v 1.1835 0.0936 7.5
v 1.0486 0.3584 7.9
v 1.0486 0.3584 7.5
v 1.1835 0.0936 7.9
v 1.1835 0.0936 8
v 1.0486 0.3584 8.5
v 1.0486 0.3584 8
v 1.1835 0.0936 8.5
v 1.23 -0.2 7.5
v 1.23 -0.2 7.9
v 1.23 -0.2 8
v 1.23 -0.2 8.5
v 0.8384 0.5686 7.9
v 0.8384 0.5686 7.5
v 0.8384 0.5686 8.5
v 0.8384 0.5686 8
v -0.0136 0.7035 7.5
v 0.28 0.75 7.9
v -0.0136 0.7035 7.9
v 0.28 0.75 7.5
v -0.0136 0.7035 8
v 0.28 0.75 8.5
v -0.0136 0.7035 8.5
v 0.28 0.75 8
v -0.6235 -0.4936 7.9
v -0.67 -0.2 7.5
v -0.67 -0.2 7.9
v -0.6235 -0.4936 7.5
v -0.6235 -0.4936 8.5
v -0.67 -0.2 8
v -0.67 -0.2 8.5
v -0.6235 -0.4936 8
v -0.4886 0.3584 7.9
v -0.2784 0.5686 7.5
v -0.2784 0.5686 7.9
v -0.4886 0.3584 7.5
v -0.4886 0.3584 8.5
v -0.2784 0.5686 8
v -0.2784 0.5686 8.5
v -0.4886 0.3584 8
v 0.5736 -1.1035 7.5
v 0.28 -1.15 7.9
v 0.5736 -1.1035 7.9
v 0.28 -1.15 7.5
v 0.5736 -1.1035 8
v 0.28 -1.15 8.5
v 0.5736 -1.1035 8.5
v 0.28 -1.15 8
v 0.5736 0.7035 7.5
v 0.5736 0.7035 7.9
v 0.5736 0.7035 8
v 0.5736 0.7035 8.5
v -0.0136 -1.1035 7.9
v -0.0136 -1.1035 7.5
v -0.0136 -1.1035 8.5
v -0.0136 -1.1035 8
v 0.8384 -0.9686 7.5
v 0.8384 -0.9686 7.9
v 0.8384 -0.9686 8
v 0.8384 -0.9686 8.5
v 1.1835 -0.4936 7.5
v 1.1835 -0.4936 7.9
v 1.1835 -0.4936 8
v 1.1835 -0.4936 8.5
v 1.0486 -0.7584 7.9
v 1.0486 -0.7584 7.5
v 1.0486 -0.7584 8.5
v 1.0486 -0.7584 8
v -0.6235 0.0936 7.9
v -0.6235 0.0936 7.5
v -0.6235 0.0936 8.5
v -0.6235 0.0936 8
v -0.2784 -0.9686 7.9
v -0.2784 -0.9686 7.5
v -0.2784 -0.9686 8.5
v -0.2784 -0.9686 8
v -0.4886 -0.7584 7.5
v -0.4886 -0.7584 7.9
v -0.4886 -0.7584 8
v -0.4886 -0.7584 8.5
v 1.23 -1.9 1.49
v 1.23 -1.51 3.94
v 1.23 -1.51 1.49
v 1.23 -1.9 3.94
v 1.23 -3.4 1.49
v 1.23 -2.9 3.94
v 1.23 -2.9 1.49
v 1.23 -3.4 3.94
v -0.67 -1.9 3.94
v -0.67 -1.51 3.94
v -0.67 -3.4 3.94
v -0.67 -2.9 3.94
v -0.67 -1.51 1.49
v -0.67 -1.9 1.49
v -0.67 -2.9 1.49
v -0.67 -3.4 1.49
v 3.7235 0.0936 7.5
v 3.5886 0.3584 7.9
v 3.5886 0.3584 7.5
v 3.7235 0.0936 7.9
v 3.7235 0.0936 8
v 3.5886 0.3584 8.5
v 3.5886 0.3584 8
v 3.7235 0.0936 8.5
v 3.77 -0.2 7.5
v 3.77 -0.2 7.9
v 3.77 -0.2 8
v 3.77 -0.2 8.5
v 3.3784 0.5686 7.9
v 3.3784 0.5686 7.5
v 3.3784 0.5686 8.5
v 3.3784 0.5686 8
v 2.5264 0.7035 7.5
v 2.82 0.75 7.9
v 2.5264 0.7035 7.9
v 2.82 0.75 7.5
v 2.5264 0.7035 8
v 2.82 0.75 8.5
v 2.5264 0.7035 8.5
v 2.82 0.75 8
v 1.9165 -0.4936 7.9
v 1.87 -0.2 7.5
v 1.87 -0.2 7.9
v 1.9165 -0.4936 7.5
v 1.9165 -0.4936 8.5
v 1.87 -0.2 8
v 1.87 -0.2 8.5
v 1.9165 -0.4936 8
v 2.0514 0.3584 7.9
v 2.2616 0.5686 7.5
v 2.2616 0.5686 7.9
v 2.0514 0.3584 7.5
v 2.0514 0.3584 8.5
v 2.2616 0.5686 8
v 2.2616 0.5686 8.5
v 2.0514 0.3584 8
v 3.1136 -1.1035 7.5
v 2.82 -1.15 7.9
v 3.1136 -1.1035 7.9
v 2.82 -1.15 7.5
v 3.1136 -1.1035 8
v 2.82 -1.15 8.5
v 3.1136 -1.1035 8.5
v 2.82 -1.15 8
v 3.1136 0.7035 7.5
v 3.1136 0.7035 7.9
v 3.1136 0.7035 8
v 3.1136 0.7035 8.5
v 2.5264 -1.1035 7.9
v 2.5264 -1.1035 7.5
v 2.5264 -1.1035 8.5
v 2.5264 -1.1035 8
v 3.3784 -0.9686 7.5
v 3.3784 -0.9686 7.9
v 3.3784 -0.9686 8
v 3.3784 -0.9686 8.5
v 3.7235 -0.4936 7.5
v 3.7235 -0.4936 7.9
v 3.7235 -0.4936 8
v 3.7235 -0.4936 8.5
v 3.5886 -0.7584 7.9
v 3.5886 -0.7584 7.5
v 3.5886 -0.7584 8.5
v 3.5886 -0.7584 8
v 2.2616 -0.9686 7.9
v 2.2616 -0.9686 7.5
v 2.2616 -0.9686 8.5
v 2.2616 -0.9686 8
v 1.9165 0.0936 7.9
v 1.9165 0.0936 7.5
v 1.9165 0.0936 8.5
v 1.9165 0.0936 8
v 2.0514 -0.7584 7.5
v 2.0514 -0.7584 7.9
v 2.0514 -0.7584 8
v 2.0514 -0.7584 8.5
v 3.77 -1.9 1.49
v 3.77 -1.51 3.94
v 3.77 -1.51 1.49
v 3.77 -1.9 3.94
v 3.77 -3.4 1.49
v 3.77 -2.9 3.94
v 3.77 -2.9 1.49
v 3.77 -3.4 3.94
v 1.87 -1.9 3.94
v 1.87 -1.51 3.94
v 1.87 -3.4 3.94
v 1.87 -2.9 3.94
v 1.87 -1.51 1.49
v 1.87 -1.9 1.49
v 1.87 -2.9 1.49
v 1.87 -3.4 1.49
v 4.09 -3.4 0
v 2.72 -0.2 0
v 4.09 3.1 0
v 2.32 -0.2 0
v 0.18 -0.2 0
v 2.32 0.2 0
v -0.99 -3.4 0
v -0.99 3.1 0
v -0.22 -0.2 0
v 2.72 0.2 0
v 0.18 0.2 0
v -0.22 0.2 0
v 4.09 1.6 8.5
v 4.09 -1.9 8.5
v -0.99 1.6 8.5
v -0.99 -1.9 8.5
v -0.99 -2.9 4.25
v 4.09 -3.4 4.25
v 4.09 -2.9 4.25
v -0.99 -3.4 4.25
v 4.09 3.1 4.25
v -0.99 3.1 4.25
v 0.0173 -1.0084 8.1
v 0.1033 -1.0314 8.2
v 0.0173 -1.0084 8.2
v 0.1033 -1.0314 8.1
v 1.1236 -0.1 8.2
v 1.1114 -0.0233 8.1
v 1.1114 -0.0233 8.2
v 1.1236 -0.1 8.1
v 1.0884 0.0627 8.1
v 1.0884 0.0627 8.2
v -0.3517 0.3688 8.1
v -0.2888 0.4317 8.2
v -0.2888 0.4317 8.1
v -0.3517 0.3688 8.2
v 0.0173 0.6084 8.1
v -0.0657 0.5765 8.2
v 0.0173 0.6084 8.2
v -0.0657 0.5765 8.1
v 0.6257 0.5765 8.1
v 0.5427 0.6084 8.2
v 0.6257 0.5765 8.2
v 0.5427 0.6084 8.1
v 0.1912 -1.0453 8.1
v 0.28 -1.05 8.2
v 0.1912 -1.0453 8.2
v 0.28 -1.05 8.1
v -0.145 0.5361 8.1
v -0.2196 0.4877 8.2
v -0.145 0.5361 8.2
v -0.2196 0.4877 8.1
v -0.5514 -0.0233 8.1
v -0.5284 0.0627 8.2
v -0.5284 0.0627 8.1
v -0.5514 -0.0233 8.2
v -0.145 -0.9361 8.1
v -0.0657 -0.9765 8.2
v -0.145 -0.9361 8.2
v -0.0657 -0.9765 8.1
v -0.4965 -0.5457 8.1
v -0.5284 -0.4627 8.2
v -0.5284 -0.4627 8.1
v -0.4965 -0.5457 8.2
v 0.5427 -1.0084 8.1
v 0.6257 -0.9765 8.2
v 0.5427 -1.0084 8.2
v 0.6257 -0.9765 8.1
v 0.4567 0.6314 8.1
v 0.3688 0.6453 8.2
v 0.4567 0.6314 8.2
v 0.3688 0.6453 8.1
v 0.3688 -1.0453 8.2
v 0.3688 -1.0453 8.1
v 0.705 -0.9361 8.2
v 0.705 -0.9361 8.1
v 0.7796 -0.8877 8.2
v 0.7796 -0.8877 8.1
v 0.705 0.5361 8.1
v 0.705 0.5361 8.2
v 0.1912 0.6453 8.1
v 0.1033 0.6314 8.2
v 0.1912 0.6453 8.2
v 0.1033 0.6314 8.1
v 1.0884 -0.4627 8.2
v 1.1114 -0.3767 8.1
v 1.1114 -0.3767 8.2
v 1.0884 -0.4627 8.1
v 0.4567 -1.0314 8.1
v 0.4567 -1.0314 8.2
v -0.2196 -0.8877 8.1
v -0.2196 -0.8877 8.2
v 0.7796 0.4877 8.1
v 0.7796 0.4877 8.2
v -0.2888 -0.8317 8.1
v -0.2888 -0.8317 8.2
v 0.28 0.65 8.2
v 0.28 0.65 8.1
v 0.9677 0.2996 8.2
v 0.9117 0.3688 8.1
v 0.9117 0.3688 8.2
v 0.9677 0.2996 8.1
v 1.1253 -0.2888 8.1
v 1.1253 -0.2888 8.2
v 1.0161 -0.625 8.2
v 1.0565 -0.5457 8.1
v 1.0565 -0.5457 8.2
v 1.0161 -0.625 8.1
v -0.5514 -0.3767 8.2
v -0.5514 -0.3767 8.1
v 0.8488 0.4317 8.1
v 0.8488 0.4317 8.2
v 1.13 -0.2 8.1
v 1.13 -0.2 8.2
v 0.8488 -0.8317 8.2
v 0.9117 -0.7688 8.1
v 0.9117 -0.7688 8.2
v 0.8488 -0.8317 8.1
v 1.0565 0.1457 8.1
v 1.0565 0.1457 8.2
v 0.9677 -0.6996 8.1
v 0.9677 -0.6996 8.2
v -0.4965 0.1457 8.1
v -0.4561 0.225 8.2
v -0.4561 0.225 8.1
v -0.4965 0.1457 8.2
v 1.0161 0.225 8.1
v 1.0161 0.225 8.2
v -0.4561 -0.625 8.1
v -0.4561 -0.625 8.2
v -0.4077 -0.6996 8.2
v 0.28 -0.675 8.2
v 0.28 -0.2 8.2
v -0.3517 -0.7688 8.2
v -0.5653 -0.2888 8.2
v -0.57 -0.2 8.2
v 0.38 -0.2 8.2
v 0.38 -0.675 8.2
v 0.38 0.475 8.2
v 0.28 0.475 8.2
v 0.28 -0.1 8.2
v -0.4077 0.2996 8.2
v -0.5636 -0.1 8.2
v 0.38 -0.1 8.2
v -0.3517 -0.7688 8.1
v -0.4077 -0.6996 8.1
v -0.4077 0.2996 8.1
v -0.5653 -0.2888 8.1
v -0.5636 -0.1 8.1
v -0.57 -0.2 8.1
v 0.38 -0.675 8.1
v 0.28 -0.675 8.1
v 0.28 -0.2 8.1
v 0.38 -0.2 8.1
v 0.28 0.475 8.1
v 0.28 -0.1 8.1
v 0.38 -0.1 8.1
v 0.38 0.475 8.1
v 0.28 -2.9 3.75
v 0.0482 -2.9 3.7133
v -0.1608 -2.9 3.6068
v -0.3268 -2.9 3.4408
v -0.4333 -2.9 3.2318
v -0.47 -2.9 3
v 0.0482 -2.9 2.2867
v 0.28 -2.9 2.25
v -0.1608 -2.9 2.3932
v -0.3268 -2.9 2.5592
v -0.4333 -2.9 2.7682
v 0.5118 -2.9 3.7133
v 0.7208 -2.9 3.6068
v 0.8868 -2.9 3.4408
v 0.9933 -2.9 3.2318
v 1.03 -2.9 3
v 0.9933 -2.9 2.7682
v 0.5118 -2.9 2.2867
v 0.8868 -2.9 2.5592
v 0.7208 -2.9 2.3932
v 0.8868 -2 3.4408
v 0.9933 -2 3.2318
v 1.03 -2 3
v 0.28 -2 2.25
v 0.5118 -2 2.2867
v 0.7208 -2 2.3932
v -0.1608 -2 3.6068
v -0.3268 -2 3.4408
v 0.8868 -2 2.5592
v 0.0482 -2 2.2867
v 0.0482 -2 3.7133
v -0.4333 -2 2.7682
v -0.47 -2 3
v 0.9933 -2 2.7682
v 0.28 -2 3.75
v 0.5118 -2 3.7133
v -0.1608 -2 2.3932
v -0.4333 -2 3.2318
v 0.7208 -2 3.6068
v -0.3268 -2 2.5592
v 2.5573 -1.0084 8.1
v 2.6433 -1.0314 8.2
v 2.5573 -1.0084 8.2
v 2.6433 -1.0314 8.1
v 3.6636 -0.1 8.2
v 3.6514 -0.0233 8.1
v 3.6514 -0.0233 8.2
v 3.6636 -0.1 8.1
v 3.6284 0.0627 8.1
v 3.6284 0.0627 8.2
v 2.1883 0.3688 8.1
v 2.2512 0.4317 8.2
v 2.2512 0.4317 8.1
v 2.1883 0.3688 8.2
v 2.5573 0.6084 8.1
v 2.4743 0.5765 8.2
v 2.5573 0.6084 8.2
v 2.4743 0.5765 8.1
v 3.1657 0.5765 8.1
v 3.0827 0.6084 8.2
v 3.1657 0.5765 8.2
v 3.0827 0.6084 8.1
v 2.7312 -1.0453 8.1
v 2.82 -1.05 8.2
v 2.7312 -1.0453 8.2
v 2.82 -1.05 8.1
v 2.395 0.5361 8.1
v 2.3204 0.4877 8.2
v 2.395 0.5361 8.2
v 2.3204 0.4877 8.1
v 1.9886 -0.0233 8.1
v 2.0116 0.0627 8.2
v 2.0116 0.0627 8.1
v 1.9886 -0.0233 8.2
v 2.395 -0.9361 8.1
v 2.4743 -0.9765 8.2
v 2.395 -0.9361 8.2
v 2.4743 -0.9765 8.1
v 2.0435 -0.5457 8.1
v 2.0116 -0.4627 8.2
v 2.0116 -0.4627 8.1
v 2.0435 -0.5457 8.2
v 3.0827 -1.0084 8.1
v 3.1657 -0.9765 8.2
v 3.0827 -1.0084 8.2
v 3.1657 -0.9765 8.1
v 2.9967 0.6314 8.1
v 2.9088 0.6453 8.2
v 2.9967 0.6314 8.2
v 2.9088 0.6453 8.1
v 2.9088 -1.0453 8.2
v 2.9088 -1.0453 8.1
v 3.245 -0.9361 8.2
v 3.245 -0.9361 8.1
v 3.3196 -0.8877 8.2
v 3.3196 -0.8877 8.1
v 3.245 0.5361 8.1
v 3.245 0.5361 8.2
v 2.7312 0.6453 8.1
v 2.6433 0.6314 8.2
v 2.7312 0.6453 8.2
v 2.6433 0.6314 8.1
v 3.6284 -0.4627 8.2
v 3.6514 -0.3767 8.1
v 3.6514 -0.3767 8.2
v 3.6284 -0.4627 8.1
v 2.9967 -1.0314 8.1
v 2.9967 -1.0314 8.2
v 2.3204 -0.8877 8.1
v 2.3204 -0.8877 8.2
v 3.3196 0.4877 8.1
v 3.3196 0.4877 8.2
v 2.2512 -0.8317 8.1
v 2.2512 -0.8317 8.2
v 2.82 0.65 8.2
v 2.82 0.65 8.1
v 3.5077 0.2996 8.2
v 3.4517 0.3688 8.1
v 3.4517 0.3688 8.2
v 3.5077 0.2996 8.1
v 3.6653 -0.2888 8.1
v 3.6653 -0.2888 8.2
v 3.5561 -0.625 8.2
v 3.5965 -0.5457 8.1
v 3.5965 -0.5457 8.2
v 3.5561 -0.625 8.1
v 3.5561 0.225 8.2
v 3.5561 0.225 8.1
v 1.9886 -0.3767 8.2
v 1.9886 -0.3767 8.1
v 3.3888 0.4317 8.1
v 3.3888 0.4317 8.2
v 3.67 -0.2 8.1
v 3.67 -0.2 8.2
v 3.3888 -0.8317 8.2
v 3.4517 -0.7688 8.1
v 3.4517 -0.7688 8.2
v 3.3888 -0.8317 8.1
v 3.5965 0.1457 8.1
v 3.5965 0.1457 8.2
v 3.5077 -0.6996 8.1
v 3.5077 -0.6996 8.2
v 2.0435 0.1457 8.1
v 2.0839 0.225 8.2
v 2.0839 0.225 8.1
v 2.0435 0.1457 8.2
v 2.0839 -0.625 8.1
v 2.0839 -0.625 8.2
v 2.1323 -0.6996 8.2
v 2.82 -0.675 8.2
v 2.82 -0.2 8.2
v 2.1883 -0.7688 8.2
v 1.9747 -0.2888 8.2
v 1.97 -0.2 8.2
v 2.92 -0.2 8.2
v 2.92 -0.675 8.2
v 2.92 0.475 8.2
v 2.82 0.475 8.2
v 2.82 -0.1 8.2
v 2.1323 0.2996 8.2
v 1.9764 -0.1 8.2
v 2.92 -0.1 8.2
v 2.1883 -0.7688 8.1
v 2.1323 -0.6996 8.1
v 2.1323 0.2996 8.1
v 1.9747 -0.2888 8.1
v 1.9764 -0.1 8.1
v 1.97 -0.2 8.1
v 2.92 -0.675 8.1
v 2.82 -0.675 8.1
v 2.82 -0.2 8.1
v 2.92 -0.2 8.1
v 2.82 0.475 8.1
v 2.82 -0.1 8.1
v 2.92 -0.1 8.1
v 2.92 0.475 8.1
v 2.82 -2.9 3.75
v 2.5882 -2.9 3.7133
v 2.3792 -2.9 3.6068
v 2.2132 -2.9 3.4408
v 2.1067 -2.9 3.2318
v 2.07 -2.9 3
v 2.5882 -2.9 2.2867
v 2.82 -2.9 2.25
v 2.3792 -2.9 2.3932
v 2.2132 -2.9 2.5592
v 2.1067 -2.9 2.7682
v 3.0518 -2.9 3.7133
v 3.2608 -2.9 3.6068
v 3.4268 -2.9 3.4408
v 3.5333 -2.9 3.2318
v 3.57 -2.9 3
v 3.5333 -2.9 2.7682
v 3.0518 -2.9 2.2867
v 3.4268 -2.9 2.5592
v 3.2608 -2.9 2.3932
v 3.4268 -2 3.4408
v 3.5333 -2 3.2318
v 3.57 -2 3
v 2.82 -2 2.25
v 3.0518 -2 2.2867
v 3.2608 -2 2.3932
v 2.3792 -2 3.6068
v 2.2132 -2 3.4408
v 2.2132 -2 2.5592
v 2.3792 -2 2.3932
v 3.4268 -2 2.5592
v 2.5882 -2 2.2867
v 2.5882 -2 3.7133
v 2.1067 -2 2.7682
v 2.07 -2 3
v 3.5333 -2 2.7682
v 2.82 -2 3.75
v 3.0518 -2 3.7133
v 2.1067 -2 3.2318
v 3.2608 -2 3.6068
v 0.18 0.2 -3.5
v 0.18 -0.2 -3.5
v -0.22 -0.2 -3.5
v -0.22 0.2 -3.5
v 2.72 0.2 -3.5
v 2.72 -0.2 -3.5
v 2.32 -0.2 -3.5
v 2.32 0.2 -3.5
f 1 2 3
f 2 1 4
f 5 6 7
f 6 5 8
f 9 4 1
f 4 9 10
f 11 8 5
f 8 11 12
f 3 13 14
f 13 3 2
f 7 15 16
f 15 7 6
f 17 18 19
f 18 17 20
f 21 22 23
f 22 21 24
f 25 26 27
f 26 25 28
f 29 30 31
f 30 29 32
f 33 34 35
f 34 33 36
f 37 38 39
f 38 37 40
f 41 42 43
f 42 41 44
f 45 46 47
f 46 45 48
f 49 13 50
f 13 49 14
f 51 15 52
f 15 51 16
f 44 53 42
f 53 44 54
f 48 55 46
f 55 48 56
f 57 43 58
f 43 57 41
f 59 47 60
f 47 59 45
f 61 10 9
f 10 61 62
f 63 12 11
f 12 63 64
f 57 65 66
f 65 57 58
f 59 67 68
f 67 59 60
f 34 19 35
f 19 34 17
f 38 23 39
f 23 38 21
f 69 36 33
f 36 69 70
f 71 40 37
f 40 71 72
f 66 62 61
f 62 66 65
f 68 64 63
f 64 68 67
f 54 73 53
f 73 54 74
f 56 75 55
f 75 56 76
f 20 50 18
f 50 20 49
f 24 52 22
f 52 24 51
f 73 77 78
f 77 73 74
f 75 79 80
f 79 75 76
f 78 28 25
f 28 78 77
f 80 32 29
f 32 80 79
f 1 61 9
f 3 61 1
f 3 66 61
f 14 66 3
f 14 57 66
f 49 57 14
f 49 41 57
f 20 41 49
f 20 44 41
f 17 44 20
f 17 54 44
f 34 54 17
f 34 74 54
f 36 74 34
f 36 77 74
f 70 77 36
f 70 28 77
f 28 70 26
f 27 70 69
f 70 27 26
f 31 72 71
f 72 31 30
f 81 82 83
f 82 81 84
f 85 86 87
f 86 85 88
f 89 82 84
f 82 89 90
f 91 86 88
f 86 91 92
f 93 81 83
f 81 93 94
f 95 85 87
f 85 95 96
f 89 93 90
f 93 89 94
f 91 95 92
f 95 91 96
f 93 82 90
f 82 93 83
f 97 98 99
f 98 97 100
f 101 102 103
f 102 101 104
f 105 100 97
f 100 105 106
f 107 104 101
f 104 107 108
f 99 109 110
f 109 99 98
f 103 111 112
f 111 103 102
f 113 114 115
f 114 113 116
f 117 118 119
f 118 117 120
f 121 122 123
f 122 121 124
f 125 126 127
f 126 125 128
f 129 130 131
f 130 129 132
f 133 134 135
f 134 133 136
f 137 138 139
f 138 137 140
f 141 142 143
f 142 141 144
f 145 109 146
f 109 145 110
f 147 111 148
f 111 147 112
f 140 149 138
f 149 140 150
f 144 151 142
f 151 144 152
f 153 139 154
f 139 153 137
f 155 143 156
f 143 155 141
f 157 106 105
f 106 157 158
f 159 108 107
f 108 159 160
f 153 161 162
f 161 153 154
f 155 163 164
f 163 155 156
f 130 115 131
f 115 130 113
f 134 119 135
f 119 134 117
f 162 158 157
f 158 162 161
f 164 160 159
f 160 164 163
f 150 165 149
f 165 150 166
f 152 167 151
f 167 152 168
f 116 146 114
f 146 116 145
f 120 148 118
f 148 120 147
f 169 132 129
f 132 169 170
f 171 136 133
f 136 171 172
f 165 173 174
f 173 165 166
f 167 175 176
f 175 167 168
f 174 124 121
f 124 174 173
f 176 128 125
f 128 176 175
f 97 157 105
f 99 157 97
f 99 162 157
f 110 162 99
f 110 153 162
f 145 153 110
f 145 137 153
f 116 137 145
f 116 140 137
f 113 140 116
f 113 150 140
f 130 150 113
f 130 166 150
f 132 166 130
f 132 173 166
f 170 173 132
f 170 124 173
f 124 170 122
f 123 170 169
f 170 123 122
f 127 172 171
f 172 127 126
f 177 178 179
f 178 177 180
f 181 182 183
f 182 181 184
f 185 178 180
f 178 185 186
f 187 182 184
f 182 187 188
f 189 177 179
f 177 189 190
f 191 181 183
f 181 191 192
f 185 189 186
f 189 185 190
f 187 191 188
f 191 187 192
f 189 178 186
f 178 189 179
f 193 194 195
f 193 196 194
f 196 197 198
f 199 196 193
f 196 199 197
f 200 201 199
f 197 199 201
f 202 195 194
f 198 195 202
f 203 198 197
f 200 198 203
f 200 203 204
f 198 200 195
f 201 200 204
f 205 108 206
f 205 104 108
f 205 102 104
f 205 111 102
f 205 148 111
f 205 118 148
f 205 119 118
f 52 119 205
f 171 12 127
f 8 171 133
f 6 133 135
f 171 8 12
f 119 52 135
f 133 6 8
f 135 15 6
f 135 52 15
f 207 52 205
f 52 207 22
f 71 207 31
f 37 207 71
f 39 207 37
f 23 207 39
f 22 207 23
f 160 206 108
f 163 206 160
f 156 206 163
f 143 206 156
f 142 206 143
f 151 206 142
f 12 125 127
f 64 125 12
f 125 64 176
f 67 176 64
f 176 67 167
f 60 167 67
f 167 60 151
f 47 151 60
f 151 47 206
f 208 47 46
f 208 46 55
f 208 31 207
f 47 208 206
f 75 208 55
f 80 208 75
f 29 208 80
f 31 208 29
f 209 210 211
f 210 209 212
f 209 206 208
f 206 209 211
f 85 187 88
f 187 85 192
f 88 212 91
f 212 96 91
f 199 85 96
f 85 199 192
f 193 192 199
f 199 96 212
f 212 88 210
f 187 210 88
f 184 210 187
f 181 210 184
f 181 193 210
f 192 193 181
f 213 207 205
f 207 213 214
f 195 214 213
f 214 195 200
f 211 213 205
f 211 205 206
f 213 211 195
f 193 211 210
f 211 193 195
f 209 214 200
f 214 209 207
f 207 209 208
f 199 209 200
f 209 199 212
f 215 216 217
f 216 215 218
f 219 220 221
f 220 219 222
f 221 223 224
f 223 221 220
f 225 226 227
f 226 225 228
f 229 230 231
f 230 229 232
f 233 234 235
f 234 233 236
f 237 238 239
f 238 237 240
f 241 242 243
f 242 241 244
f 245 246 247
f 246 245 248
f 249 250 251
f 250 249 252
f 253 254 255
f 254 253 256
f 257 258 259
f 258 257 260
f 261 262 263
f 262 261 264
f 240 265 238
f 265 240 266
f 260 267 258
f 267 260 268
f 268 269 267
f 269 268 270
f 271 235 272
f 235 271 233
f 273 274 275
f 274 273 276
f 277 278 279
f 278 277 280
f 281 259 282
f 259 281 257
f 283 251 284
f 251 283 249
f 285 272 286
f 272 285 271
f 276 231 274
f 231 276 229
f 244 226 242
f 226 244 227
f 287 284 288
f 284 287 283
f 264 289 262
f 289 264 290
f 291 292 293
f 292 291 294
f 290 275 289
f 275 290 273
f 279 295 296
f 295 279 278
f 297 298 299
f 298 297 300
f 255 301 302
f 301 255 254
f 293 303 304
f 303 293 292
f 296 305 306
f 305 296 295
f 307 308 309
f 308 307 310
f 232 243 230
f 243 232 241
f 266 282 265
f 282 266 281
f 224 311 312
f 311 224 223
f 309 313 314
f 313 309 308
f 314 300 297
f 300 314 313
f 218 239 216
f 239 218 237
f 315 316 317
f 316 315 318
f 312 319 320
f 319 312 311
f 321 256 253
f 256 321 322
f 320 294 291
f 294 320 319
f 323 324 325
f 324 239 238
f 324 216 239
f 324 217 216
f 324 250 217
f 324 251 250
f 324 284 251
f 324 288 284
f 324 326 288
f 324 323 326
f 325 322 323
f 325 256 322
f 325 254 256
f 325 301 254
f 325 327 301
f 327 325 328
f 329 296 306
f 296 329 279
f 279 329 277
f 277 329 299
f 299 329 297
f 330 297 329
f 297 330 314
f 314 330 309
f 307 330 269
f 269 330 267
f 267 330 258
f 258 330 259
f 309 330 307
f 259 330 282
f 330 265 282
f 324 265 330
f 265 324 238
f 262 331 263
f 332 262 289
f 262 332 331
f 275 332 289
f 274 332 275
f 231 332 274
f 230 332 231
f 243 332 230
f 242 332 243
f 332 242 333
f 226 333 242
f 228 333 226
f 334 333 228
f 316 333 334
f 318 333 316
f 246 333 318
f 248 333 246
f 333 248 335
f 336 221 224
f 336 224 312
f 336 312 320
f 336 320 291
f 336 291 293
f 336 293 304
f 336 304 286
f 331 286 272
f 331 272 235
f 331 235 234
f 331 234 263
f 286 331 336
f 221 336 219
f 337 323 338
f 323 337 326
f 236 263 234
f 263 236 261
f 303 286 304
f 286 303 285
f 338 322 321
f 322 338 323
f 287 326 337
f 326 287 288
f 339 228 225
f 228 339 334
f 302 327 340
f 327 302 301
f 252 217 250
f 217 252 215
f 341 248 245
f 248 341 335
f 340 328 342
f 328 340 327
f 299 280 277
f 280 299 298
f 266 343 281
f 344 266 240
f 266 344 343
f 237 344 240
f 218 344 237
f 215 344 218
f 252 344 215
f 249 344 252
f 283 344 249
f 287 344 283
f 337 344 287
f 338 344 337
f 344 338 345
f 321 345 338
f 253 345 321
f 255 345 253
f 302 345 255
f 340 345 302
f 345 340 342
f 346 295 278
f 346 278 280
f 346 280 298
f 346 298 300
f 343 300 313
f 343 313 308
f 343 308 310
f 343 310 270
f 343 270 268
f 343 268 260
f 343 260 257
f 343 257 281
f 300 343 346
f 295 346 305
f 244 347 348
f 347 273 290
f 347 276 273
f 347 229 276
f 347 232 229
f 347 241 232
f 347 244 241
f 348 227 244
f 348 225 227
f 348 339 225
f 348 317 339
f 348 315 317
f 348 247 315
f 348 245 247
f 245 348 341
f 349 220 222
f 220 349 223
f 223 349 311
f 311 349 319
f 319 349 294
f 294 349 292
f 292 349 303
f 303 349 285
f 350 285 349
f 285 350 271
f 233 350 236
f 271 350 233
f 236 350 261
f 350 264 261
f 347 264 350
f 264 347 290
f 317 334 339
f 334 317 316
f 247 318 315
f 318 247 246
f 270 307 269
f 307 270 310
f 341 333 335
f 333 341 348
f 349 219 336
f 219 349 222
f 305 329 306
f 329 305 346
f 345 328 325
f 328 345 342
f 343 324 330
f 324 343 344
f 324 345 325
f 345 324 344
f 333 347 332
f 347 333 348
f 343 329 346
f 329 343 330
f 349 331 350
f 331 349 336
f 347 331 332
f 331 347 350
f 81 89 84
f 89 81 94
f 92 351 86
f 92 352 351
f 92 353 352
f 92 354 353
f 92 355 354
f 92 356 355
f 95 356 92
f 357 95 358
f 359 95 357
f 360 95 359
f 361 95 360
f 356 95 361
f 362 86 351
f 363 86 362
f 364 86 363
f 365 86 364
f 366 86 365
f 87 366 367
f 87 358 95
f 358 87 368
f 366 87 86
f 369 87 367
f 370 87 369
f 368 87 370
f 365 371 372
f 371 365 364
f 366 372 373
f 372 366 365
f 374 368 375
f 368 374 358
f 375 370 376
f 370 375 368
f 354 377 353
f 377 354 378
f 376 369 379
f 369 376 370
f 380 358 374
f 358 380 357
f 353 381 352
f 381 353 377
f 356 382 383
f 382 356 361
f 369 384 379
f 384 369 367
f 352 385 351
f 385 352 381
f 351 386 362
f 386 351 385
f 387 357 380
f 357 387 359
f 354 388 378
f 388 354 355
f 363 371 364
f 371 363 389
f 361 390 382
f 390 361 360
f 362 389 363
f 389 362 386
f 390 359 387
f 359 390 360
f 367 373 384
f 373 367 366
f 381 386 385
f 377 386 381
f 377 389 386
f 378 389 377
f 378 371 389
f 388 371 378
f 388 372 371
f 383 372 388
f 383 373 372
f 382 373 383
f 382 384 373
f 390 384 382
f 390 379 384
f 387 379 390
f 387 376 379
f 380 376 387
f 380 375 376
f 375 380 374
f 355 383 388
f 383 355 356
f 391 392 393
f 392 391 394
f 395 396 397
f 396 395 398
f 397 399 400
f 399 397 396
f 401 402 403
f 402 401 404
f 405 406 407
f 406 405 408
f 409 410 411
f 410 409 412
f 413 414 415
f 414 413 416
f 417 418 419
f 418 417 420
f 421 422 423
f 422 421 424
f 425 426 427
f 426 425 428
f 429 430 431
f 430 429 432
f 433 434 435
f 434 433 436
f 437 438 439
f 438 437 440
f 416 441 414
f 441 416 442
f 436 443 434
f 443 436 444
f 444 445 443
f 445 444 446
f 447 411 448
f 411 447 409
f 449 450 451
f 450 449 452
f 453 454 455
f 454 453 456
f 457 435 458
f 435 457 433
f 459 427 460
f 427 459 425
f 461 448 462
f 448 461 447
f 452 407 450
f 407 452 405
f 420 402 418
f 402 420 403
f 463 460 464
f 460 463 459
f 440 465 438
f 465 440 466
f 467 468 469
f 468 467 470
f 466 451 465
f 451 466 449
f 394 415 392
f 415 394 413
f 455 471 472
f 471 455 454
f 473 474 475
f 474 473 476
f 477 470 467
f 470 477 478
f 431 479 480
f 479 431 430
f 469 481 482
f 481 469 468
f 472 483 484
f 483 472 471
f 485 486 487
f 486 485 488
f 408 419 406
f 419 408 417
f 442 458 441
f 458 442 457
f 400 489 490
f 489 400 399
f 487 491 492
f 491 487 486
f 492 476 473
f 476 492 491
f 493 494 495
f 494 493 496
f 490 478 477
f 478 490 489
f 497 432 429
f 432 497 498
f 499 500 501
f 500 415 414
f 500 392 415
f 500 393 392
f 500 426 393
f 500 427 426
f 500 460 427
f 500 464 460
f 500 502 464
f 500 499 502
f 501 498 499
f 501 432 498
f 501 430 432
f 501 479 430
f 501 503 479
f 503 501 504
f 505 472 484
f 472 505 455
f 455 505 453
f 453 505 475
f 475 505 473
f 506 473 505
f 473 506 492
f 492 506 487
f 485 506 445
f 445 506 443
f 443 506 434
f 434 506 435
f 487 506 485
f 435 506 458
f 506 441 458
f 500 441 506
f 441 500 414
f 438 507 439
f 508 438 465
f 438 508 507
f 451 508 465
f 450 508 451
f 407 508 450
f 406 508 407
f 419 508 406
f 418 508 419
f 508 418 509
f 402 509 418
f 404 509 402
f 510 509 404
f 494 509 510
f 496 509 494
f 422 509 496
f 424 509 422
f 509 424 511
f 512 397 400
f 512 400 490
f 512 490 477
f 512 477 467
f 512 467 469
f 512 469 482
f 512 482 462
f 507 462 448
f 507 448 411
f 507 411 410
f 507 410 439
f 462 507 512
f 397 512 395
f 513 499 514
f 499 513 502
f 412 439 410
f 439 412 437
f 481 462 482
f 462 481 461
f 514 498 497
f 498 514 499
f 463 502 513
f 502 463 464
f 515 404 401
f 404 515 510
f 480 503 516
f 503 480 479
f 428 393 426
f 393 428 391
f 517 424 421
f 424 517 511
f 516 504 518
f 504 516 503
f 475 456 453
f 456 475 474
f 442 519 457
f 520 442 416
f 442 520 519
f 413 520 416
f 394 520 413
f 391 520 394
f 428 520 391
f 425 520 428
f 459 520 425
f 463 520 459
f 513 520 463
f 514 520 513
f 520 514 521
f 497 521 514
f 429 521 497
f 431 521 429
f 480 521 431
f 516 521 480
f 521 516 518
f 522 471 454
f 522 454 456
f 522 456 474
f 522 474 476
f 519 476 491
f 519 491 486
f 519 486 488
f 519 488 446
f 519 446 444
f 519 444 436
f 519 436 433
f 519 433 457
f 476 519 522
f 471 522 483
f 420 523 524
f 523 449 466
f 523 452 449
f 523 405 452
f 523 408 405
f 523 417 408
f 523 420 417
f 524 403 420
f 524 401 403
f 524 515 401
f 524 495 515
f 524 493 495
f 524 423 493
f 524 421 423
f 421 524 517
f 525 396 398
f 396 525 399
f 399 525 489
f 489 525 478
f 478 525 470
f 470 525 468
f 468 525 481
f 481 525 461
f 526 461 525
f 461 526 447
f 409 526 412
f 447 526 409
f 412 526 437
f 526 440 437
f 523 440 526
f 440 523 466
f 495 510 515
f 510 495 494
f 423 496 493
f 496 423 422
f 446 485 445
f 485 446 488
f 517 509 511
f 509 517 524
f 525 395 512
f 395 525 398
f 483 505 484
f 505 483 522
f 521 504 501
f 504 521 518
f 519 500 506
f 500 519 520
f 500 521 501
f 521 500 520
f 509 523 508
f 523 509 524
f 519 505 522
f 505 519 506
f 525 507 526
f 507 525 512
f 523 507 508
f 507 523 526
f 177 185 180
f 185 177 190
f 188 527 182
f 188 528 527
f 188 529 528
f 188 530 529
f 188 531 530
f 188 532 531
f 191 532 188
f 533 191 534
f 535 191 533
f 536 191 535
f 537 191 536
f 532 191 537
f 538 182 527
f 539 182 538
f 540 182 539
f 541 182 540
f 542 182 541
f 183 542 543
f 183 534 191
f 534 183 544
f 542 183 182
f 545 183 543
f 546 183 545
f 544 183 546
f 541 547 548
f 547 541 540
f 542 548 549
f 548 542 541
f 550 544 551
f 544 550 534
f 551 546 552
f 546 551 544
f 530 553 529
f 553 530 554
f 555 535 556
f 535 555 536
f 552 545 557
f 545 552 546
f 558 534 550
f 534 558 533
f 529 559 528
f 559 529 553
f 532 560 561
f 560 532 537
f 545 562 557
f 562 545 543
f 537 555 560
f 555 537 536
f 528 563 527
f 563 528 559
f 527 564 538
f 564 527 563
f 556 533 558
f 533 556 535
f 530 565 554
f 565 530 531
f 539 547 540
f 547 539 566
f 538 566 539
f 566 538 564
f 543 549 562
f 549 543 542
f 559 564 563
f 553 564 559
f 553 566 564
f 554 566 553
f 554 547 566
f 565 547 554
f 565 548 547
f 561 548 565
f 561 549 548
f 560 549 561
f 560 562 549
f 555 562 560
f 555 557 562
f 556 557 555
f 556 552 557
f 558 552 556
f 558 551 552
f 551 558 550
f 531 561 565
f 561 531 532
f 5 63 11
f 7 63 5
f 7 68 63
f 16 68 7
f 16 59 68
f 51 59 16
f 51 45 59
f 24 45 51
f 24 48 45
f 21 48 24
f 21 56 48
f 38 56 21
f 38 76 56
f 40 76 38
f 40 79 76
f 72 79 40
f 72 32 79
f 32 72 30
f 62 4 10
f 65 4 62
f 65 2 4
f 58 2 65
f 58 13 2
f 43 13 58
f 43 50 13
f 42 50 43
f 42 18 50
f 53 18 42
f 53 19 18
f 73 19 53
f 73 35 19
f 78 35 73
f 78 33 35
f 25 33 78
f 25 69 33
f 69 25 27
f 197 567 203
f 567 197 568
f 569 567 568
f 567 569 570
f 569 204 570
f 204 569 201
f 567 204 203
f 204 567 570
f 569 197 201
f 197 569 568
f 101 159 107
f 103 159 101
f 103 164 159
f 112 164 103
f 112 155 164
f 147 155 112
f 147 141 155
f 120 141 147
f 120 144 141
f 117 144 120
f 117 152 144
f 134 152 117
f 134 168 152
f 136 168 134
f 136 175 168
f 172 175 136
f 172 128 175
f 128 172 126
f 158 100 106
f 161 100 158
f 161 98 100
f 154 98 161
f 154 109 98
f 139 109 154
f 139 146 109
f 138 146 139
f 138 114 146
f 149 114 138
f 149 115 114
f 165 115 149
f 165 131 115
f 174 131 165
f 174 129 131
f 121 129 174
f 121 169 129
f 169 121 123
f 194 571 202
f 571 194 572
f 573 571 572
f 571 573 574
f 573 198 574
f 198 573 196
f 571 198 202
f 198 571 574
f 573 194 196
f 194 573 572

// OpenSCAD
// Generates a terminal block parametrically
// https://www.digikey.ca/en/products/detail/on-shore-technology-inc/OSTVN05A150/1588865?s=N4IgjCBcpgDA7AViqAxlAZgQwDYGcBTAGhAHsoBtEAJmoE5ZYIBdEgBwBcoQBlDgJwCWAOwDmIAL4kAtABYUIdJGz5iZSiABs2gBwhWITt0kSJQA

np=2; // number of terminals
dp=2.54; // spacing between pins
sd=1.9; // screw diameter
wd=1.5; // wire hole diameter
pkgDepth=6.5;
pkgHeight=8.5;
pinDepth=3.2;
pinLength=3.5;
pinSize=0.4;
pkgColor="#76AE8D";

module body() {
    difference() {
        color(pkgColor)
        polyhedron( 
        points = [
        // bottom plane
        [ 0,         0,          0 ], // 0
        [ 0,         pkgDepth,   0 ], // 1
        [ np*dp,     pkgDepth,   0 ], // 2
        [ np*dp,     0,          0 ], // 3

        // top plane
        [ 0,         pkgDepth-1.5,   pkgHeight ], // 4
        [ np*dp,     pkgDepth-1.5,   pkgHeight ], // 5
        [ np*dp,     1.5,   pkgHeight ], // 6
        [ 0,         1.5,   pkgHeight ], // 7

        // the mid kneel point (front)
        [ 0,         0,   pkgHeight/2 ], // 8
        [ 0,         0.5, pkgHeight/2 ], // 9
        [ np*dp,     0.5, pkgHeight/2 ], // 10
        [ np*dp,     0,   pkgHeight/2 ], // 11
            
        // the mid kneel point (back)
        [ 0,         pkgDepth, pkgHeight/2 ], // 12
        [ np*dp,     pkgDepth, pkgHeight/2 ], // 13
        ],
        faces = [
        [0, 3, 2, 1 ], // bottom face
        [4, 5, 6, 7 ], // top face
        [8, 9, 10,11], // mid kneel point
        [9, 7, 6, 10], // front angle part
        [0, 8, 11,3 ], // front vertical
        [4, 12, 13, 5 ], // back vertical
        [12, 1, 2, 13 ], // back vertical
        [6, 5, 13, 2, 3, 11, 10 ], // right side
        [4, 7, 9, 8, 0,  1, 12  ] // left side
        ]);

      // the holes for the screws and the front screw terminal places
      for (a =[1:np]) {
        c = (a == 1) ? dp/2 : (a-1)*dp + dp/2;
        translate([c, pinDepth, pkgHeight-1]) color(pkgColor) cylinder( h=2, r=(sd/2), $fn=20);
        
        translate([c-(sd/2), -0.01, 1.49]) color(pkgColor) cube([ sd, sd, pkgHeight/2-1.8 ]);  
      } // for
    }
}

module pins() {
    for (a =[1:np]) {
        c = (a == 1) ? dp/2 : (a-1)*dp + dp/2;

        // the screws on the top
        translate([c, pinDepth, pkgHeight-0.6]) color("#C0C0C0") cylinder( h=0.1, r=(sd/2), $fn=60);
        difference() {
        translate([c, pinDepth, pkgHeight-0.4]) color("#C0C0C0") cylinder( h=0.1, r=sd/2-0.1, $fn=60);
        translate([c-(sd/2), pinDepth, pkgHeight-0.7]) color("#C0C0C0") cube([sd, 0.1, 0.5]);
            
        translate([c+0.1, pinDepth-sd/4, pkgHeight-0.7])rotate([0, 0, 90])
            color("#C0C0C0") cube([sd/2+.2, 0.1, 0.5]); 
        }
        
        // the metal front pieces
        difference() {
        translate([c-(sd/2), 0.5, 0.99]) color("#C0C0C0") cube([ sd, 1, pkgHeight/2-1 ]);
        translate([c, 1.4, 3]) rotate([90,0,0]) color("#C0C0C0") cylinder(r=wd/2, h=1.3, $fn=20);
        }
        translate([c-0.5,pinDepth,-pinLength])color("#C0C0C0")cube([pinSize,pinSize, pinLength]);
    } // for
}

translate([-dp/2+0.28,-pinDepth-pinSize/2,0])
union() {
    body();
    pins();
}
